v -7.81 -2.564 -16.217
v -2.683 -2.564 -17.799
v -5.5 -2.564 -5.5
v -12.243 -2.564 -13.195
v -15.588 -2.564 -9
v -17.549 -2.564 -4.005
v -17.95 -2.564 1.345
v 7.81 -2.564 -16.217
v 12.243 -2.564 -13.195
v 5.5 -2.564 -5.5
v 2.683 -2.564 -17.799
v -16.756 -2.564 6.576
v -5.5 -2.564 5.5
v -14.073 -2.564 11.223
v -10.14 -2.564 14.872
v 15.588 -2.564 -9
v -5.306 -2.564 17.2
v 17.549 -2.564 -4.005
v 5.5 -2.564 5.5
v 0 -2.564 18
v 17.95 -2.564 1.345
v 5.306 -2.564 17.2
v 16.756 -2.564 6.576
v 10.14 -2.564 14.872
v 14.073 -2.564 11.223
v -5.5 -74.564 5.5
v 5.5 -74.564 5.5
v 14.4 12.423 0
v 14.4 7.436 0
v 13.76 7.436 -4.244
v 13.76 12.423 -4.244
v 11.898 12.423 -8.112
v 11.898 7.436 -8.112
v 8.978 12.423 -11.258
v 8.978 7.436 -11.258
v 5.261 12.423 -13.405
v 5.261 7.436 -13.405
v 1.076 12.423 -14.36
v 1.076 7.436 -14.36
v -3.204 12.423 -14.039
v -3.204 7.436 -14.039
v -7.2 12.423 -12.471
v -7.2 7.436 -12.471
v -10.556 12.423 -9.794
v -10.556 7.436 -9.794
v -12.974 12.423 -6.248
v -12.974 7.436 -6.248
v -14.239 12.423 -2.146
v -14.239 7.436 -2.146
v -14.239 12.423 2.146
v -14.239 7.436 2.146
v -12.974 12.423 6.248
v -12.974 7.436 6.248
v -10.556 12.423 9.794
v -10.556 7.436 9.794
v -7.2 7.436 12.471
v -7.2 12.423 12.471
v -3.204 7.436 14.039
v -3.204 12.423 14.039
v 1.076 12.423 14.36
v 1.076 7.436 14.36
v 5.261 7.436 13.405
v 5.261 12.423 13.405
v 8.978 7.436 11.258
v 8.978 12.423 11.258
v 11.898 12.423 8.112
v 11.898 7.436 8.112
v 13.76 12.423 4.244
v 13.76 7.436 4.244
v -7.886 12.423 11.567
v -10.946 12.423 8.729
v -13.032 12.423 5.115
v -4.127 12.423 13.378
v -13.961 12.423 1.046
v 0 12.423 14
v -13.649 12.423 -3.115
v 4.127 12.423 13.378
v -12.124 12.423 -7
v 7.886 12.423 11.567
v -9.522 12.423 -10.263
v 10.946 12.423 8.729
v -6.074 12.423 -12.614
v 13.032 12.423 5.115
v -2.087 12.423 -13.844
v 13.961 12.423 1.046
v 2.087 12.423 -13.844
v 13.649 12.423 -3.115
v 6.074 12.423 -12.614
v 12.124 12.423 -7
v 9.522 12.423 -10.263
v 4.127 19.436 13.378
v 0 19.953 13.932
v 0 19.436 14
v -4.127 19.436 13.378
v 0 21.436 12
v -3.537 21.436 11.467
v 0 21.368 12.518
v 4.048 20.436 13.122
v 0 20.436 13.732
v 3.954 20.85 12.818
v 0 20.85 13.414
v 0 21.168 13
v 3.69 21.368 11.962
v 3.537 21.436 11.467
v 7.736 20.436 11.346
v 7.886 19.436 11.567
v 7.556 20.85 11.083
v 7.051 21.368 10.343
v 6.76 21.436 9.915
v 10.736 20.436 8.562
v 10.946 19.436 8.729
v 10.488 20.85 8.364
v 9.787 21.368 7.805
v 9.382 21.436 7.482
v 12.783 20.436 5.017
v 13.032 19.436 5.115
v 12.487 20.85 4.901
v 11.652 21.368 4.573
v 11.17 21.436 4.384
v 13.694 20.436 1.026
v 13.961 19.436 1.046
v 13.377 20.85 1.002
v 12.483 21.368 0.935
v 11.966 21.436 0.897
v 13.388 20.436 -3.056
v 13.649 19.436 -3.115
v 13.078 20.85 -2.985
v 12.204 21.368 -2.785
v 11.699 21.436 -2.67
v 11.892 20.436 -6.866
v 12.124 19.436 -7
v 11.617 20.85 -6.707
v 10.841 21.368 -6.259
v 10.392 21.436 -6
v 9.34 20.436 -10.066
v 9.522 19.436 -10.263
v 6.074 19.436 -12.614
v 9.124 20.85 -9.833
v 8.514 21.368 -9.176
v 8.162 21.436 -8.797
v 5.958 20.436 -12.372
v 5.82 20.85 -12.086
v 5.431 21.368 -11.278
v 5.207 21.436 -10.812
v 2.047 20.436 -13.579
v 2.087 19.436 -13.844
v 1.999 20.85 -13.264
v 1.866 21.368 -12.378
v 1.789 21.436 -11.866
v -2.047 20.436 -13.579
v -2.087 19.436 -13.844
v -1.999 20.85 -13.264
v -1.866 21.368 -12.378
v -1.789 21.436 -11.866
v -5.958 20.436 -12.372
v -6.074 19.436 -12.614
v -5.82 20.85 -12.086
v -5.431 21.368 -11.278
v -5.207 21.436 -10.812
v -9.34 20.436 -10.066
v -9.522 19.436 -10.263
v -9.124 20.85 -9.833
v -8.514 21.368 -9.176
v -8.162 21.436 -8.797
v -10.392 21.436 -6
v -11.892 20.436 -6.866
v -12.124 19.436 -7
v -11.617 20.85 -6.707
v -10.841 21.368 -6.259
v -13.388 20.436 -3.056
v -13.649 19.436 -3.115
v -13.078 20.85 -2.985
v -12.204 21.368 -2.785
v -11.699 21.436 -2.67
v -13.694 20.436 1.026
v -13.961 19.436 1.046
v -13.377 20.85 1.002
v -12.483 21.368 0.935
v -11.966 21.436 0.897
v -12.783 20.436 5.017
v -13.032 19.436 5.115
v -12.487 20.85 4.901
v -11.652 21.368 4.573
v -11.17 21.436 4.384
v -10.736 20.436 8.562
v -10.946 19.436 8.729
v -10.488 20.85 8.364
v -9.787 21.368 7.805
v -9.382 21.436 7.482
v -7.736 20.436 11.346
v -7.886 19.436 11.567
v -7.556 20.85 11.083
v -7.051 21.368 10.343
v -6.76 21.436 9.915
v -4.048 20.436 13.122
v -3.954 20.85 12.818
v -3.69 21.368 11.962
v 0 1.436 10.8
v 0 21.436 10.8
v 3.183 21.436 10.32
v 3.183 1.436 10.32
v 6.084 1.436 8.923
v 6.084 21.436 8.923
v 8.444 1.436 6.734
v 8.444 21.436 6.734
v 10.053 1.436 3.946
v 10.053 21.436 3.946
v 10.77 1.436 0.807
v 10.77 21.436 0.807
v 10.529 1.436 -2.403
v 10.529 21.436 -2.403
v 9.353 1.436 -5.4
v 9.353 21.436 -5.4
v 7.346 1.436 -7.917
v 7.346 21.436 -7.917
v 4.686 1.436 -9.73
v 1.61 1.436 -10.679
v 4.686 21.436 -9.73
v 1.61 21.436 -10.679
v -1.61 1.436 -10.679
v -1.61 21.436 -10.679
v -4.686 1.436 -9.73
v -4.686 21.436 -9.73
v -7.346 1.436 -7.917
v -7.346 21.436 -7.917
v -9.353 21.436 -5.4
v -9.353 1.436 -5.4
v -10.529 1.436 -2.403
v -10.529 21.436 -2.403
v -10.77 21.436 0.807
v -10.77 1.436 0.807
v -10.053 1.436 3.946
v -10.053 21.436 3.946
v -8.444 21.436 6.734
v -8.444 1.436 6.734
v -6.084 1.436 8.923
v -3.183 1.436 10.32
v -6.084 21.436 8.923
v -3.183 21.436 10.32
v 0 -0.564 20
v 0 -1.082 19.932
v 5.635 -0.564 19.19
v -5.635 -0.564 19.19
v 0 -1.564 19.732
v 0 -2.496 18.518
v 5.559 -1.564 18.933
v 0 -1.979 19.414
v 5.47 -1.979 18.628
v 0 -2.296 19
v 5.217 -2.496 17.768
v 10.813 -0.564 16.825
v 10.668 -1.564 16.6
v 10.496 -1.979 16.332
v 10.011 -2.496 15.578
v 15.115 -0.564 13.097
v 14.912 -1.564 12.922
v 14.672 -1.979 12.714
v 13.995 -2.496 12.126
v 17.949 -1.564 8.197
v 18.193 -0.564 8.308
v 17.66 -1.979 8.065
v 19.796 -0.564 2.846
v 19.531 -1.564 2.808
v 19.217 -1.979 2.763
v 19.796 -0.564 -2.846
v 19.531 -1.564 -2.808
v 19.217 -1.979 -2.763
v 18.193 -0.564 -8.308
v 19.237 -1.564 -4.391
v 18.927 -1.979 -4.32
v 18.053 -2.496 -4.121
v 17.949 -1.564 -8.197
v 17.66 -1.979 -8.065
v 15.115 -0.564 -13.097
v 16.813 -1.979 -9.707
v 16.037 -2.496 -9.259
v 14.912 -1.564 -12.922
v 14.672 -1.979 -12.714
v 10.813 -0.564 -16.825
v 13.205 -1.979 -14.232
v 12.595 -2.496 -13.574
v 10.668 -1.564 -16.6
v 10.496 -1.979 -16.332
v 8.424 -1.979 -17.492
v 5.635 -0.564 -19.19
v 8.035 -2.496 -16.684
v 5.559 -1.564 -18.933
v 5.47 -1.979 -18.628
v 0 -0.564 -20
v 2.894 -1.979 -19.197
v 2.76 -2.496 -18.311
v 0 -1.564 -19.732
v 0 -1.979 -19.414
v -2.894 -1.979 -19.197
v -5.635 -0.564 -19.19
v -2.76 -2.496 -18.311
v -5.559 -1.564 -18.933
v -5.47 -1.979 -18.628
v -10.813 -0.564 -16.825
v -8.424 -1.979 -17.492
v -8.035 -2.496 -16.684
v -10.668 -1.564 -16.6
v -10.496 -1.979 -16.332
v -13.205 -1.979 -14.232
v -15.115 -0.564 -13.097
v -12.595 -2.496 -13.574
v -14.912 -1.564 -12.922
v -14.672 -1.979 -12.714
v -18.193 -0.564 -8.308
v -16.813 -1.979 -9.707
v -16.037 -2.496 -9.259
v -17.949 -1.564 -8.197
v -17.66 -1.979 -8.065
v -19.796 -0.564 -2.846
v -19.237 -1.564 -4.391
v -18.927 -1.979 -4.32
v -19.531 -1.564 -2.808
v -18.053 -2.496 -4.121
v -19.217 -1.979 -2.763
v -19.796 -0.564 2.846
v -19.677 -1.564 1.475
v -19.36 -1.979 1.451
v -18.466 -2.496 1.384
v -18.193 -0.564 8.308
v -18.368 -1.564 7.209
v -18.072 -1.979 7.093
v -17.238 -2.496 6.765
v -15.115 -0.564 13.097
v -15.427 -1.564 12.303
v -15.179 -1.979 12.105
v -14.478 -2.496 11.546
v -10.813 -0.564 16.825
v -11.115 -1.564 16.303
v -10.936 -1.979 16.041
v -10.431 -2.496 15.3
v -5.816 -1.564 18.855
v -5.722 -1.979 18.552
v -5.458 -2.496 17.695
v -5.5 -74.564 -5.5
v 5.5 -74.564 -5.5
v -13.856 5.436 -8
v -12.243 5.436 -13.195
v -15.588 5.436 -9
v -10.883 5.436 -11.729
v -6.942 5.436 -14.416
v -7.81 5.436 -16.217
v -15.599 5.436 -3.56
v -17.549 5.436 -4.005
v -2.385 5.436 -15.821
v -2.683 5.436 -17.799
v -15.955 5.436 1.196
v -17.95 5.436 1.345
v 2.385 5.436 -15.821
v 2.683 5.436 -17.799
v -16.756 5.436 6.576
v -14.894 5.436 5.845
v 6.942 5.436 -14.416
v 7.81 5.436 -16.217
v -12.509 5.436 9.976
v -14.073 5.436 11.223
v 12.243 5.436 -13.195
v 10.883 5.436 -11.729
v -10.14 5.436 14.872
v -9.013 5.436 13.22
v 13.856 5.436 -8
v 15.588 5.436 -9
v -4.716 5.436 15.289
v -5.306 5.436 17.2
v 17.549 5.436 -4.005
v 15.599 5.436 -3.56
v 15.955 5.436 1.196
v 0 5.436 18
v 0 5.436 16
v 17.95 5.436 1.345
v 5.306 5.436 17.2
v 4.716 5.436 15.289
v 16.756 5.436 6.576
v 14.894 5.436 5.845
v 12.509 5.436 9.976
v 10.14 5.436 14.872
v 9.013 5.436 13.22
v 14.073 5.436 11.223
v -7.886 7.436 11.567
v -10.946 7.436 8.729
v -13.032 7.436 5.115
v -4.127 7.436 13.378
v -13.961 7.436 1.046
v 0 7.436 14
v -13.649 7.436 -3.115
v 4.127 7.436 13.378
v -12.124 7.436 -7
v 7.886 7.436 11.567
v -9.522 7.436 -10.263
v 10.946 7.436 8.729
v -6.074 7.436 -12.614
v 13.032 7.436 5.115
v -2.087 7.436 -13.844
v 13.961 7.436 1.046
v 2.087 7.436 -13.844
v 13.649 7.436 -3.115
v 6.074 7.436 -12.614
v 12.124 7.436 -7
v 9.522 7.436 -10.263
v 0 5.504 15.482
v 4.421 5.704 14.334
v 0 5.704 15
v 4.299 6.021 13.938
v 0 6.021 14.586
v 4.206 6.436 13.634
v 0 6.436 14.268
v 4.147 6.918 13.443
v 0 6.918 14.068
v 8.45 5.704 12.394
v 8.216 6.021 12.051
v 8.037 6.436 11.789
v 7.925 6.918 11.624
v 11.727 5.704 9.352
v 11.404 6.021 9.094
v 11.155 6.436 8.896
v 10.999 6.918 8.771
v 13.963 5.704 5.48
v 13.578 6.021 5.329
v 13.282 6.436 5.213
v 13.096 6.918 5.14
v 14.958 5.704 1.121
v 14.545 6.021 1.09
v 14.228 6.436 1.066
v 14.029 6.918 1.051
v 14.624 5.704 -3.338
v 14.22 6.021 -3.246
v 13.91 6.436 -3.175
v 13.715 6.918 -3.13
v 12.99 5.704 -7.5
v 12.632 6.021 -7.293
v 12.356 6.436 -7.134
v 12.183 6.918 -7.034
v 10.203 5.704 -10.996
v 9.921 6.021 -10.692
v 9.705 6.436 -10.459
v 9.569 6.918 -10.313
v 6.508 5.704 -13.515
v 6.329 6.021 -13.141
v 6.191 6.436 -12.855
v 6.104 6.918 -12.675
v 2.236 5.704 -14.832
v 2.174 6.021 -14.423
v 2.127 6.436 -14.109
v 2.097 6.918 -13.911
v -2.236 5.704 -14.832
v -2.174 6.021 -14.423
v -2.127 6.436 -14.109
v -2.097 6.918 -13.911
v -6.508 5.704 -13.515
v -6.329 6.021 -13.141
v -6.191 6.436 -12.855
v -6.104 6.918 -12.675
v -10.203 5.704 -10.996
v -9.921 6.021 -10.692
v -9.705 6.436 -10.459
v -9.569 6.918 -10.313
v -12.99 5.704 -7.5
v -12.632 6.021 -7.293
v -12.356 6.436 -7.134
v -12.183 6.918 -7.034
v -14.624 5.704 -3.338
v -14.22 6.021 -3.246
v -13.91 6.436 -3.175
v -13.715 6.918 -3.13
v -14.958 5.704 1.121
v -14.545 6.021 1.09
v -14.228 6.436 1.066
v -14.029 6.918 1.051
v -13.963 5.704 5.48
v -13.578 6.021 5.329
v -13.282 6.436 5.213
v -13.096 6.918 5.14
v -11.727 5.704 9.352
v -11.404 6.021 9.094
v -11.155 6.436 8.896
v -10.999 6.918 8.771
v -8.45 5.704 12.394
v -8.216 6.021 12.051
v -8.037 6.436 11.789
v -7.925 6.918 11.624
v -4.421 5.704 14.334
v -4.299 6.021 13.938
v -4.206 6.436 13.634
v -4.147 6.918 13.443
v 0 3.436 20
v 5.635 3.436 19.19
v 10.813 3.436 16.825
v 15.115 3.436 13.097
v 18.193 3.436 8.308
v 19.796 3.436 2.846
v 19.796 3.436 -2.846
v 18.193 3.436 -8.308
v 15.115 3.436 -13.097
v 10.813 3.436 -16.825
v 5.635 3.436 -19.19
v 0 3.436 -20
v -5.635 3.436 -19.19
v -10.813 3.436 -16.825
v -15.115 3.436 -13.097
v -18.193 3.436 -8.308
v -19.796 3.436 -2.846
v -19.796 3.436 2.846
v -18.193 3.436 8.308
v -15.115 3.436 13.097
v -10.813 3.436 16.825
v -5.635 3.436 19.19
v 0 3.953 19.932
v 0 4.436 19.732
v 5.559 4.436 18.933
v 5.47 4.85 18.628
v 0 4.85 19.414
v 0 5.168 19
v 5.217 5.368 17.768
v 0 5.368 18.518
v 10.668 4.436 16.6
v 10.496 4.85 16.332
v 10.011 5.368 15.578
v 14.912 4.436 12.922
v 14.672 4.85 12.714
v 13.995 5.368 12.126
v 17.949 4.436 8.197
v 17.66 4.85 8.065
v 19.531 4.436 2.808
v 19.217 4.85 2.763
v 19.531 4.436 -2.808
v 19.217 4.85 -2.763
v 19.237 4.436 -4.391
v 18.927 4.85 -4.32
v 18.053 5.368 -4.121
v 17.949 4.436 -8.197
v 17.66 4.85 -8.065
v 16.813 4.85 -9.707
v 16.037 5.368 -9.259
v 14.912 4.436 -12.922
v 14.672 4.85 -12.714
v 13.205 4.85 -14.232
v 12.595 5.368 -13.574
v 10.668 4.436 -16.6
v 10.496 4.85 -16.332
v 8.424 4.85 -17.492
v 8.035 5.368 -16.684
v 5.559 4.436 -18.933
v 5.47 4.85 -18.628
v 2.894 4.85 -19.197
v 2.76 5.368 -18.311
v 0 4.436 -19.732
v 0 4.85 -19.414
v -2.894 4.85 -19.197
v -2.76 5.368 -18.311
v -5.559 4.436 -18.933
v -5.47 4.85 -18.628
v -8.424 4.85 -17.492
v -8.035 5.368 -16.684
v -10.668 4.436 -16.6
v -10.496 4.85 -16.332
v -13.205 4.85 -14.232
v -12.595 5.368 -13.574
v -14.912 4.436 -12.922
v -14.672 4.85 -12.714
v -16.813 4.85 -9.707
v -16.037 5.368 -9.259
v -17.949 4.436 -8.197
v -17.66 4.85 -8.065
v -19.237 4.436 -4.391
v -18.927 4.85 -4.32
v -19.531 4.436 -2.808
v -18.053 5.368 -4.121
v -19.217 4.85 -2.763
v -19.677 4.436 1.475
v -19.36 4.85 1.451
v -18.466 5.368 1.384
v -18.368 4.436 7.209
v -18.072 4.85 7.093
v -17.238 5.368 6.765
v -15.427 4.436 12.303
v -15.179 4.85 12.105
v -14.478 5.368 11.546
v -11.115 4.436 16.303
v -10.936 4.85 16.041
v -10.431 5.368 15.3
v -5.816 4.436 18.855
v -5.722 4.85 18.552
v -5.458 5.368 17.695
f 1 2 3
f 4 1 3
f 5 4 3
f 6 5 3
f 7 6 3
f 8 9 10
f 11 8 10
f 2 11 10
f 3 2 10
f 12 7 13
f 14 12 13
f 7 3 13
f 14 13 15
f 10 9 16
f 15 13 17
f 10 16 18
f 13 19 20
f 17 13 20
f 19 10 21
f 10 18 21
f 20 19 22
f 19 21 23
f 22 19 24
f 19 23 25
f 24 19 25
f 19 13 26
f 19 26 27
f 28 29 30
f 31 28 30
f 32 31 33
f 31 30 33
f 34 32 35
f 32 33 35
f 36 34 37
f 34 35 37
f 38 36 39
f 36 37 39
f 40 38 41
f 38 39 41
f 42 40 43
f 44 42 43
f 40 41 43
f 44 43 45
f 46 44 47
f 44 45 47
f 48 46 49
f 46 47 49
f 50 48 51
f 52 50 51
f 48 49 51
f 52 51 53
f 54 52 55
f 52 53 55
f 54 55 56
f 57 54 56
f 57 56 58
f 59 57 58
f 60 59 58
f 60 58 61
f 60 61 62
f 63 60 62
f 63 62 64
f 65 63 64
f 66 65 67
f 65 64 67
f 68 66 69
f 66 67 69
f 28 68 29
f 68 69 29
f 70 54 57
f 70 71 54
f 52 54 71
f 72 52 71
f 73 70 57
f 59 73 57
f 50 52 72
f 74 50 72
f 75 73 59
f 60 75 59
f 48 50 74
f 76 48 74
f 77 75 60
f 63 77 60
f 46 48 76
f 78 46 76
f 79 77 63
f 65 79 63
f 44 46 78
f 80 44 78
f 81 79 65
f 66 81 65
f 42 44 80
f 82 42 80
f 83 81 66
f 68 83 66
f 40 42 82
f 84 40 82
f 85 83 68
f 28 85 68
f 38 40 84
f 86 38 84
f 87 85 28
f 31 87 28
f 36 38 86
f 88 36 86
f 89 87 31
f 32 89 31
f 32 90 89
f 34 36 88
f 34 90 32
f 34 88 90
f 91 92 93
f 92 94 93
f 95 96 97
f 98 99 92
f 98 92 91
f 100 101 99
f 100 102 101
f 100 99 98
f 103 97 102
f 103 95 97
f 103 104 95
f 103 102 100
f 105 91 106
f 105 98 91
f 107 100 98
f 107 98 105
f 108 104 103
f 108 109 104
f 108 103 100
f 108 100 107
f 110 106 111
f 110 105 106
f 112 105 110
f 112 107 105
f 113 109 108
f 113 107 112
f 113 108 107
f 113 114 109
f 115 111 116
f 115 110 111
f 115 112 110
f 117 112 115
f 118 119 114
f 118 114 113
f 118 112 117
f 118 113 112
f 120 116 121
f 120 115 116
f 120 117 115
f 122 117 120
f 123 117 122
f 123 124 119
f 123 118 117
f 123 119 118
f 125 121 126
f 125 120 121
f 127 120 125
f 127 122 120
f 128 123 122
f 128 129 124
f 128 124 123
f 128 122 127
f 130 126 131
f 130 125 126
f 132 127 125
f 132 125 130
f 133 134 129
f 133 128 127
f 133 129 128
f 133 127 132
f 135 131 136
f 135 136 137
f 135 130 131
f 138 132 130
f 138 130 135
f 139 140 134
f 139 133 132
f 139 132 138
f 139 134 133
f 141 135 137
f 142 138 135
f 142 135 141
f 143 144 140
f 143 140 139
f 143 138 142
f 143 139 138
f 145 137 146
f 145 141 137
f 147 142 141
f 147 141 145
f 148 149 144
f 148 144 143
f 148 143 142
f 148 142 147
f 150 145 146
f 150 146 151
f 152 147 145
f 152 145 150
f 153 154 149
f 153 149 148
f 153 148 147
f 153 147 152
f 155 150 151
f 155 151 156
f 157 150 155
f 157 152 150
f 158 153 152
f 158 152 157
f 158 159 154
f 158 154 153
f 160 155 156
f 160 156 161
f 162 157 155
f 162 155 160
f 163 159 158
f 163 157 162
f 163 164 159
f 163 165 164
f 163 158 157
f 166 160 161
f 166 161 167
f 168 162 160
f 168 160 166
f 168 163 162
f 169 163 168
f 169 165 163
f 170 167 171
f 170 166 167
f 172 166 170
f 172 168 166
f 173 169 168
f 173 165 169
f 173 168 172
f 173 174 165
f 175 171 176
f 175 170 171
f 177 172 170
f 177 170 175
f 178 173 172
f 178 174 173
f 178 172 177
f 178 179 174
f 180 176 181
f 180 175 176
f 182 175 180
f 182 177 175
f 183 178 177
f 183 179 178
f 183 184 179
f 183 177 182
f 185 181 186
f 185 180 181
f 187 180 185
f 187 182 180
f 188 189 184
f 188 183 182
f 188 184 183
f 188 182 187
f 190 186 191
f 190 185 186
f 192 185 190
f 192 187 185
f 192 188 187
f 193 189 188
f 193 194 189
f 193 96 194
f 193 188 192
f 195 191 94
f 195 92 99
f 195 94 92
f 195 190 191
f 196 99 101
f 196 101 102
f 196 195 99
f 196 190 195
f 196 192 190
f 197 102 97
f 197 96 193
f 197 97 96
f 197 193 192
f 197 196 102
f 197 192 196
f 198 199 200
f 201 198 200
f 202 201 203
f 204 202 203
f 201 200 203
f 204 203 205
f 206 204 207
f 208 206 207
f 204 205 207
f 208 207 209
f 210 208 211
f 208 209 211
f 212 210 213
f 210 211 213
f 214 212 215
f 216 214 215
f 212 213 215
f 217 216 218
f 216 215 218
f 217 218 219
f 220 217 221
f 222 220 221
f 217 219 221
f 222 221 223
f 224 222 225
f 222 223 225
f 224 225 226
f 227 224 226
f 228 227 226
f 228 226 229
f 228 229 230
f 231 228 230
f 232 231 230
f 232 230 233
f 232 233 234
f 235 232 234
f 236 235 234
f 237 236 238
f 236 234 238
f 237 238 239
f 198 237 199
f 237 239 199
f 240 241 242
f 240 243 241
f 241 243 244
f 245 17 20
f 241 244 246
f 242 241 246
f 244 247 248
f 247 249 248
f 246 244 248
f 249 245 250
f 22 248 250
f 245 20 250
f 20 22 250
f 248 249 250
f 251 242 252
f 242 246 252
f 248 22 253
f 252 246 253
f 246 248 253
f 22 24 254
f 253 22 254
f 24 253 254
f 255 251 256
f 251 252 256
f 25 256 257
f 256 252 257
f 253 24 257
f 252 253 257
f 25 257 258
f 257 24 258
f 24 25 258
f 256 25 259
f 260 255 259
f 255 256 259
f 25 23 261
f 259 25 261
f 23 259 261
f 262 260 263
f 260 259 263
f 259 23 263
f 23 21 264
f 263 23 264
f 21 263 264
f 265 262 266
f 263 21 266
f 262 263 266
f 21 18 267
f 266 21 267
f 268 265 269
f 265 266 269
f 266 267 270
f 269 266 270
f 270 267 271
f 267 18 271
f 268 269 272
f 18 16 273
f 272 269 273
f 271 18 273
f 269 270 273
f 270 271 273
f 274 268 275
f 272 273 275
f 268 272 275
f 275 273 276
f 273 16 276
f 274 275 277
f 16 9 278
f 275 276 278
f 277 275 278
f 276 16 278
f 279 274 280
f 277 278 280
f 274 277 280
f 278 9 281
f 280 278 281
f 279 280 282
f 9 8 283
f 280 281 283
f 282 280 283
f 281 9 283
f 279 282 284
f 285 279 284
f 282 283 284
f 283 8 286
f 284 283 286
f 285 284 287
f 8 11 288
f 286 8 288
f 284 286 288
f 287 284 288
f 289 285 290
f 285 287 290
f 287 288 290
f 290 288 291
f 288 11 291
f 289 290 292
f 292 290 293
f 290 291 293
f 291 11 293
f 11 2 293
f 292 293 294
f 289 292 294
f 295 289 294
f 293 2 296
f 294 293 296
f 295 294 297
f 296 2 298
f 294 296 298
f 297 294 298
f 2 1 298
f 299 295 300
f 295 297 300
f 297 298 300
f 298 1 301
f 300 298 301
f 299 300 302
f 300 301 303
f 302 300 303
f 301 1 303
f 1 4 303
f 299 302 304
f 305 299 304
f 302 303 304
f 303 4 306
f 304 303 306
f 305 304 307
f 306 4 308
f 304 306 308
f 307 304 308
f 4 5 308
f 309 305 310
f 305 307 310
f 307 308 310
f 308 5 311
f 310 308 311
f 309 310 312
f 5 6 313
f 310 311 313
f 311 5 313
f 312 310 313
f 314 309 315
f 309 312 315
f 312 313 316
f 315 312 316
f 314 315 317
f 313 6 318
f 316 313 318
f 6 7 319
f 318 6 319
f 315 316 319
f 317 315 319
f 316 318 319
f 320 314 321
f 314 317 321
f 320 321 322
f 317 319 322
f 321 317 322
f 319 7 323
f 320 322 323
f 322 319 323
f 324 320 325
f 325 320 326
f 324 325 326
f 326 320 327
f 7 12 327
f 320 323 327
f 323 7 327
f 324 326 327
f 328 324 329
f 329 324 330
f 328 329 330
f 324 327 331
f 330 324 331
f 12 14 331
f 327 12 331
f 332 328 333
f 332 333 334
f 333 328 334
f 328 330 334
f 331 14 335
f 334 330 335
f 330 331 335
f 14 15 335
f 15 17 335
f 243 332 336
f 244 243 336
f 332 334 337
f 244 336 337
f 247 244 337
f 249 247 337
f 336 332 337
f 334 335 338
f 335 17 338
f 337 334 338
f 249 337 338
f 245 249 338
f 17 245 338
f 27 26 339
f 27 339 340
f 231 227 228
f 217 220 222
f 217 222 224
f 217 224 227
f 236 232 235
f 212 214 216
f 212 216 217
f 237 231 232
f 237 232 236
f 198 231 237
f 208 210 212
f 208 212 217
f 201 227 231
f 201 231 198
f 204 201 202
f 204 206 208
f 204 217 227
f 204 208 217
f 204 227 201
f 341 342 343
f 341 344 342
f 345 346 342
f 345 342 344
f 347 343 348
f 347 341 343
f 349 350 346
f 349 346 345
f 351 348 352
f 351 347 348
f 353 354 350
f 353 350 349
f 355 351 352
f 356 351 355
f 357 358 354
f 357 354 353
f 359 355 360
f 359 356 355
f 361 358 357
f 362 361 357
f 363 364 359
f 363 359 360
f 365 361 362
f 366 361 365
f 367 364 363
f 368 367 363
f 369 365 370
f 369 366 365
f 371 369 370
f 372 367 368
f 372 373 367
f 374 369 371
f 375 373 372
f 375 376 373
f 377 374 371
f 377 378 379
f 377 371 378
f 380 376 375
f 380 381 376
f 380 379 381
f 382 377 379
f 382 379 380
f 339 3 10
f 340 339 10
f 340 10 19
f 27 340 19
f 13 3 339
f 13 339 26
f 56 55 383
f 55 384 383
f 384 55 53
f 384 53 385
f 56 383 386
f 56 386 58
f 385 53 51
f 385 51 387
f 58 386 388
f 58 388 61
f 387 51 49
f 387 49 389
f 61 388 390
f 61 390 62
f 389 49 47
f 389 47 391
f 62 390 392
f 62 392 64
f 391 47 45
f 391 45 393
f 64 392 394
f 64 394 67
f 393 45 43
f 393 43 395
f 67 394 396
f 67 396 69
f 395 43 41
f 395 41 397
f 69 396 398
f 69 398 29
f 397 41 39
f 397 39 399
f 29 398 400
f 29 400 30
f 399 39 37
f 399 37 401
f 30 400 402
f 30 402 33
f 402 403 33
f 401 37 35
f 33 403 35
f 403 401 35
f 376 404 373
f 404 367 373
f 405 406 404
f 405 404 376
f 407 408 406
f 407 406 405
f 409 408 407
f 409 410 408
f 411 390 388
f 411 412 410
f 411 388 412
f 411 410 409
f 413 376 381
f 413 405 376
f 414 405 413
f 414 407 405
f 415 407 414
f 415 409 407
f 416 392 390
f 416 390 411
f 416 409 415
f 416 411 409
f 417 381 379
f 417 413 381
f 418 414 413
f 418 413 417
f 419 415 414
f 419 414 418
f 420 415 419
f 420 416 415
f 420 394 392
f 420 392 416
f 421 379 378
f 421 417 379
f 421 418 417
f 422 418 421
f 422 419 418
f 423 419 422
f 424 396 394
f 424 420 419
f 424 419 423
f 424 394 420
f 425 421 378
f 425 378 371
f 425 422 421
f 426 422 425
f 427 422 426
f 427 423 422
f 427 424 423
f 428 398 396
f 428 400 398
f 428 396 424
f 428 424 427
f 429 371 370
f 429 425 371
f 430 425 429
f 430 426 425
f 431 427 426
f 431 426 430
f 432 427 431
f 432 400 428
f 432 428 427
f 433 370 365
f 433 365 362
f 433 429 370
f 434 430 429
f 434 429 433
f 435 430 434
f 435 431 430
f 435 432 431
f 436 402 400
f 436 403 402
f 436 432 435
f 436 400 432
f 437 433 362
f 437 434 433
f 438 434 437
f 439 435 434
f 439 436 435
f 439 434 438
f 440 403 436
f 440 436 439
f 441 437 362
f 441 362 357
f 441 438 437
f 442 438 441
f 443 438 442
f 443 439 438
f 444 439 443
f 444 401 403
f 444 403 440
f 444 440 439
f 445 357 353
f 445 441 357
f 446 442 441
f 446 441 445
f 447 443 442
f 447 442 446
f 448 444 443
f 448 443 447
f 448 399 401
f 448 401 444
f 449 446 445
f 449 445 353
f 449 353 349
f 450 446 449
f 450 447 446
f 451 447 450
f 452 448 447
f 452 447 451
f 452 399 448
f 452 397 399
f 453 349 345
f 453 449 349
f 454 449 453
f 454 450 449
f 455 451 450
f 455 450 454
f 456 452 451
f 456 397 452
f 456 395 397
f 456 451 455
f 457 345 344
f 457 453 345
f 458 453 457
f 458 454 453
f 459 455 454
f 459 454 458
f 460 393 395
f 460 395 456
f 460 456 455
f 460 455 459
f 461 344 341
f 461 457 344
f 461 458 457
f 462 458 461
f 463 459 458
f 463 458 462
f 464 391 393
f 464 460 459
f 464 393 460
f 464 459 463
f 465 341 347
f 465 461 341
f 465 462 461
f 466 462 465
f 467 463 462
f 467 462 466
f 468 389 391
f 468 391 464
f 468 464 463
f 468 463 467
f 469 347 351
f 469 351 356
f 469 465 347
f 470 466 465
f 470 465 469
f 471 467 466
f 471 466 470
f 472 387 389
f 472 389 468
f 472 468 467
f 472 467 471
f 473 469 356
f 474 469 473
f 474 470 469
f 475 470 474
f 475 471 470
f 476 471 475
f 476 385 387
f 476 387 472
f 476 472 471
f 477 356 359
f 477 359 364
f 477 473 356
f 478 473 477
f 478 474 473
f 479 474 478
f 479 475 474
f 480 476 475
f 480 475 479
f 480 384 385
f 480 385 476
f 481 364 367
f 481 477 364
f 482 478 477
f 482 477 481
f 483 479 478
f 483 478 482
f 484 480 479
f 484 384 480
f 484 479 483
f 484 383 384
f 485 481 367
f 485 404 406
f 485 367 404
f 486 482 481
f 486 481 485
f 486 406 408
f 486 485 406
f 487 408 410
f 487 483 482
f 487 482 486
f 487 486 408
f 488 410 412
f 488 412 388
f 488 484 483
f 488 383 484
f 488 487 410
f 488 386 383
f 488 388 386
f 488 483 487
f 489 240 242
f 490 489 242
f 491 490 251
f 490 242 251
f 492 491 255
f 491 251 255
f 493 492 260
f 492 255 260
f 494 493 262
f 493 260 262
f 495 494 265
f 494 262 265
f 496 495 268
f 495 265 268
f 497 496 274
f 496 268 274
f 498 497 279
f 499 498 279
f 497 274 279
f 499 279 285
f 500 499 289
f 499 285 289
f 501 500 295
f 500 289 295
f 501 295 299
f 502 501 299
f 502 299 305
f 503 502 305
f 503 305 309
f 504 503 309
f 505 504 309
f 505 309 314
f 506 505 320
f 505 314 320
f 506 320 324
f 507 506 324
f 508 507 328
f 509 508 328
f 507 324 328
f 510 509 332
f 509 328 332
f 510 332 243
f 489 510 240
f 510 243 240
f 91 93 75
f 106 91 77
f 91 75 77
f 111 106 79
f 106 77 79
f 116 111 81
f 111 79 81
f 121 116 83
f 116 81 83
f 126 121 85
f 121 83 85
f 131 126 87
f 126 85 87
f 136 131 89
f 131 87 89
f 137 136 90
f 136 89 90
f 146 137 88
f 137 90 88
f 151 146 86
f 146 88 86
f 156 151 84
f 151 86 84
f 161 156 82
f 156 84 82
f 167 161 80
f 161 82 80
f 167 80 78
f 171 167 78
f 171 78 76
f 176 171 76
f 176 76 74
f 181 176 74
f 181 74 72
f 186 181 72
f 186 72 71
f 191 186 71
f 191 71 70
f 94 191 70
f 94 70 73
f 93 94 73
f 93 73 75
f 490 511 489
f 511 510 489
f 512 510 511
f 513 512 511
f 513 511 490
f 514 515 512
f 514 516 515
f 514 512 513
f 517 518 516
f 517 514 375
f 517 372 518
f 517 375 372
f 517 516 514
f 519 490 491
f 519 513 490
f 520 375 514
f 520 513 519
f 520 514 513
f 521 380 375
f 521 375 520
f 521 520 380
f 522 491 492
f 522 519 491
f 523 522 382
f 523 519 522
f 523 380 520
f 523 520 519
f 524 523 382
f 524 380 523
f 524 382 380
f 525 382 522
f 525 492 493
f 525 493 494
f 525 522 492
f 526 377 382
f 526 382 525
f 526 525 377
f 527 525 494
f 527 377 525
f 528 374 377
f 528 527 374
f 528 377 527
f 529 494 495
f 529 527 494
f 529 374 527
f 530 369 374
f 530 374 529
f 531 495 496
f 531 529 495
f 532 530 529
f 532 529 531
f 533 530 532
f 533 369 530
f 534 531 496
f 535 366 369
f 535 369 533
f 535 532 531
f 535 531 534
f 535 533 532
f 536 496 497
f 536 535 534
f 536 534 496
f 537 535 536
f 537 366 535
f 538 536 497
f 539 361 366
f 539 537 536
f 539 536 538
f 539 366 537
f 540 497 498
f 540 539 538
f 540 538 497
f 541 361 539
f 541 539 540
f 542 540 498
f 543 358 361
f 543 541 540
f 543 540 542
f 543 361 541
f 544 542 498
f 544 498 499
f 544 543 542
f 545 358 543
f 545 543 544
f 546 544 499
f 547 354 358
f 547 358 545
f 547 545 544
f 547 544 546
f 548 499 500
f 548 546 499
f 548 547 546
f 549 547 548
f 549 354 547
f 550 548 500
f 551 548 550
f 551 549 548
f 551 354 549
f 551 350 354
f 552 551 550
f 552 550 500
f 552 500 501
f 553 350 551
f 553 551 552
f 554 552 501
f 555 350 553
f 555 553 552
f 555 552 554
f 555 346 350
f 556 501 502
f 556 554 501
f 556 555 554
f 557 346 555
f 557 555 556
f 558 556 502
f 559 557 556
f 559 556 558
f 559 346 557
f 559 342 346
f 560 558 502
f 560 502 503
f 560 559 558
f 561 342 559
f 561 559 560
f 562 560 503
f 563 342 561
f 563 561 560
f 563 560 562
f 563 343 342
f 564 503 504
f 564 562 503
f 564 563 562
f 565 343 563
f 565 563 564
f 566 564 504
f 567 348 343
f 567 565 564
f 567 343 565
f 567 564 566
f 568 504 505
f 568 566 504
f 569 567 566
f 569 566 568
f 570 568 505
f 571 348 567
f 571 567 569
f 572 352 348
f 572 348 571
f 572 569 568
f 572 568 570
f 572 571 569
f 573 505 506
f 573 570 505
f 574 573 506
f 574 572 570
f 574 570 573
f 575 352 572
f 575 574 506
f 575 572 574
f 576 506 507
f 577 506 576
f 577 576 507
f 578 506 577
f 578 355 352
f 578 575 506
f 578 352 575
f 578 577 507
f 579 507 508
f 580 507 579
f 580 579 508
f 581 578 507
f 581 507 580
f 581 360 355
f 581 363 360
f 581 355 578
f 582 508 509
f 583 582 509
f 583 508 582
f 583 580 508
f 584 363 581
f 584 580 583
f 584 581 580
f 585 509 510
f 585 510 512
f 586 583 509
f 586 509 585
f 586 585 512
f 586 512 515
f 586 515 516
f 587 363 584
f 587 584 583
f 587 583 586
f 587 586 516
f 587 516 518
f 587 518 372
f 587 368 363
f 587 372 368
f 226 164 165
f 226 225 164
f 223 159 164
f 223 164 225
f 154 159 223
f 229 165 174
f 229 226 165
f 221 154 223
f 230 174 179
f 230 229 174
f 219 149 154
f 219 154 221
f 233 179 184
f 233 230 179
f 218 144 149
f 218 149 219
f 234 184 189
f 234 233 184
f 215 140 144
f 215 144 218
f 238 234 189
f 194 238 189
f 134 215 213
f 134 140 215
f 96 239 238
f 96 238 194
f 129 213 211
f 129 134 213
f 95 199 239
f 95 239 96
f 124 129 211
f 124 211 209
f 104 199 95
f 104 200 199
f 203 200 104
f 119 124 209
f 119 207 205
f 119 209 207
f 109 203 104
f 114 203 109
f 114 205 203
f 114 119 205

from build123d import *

# Parameters (mm, degrees)
SKETCH2_R           = 25
BOSS_EXTRUDE1_DEPTH = 10
SKETCH3_R           = 17.5
BOSS_EXTRUDE3_DEPTH = 20
SKETCH4_R           = 13.5
CUT_EXTRUDE1_DEPTH  = 25
SKETCH5_W           = 13.75
SKETCH5_H           = 13.75
BOSS_EXTRUDE4_DEPTH = 100
FILLET2_R           = 2.5
FILLET3_R           = 2.5
WRAP1_START         = 12.5
WRAP1_OUTLINE_R     = 18
WRAP1_OUTLINE_R_2   = 17.5
WRAP1_DEPTH         = 6.23469337
SKETCH8_W           = 13.75
SKETCH8_H           = 13.75
CUT_EXTRUDE2_DEPTH  = 5
SKETCH8_2_W         = 13.75
SKETCH8_2_H         = 13.75
CUT_EXTRUDE3_DEPTH  = 10
SCALE1_SCALE        = 0.8


# Read off the part's stored shape, not the designer's step: Wrap1
with BuildPart() as part:
    # Sketch2 → Boss-Extrude1 (new body)
    with BuildSketch(Plane(origin=(0, 0, 0), x_dir=(1, 0, 0), z_dir=(0, 1, 0))):
        with Locations(Location((0, 0, 0), (0, 0, 270))):
            Circle(SKETCH2_R)
    extrude(amount=BOSS_EXTRUDE1_DEPTH)

    # Sketch3 → Boss-Extrude3 (add)
    with BuildSketch(Plane(origin=(0, 10, 0), x_dir=(1, 0, 0), z_dir=(0, 1, 0))):
        with Locations(Location((0, 0, 0), (0, 0, 270))):
            Circle(SKETCH3_R)
    extrude(amount=BOSS_EXTRUDE3_DEPTH)

    # Sketch4 → Cut-Extrude1 (cut)
    with BuildSketch(Plane(origin=(0, 30, 0), x_dir=(1, 0, 0), z_dir=(0, 1, 0))):
        with Locations(Location((0, 0, 0), (0, 0, 270))):
            Circle(SKETCH4_R)
    extrude(amount=-CUT_EXTRUDE1_DEPTH, mode=Mode.SUBTRACT)

    # Sketch5 → Boss-Extrude4 (add)
    with BuildSketch(Plane.XZ):
        Rectangle(SKETCH5_W, SKETCH5_H)
    extrude(amount=BOSS_EXTRUDE4_DEPTH)

    # Fillet2
    fillet2_edges = [part.edges().sort_by_distance(p)[0] for p in [
        (0, 0, -25),
        (0, 10, -25),
        (0, 10, -17.5),
    ]]
    fillet(fillet2_edges, radius=FILLET2_R)

    # Fillet3
    fillet3_edges = [part.edges().sort_by_distance(p)[0] for p in [
        (0, 30, -17.5),
    ]]
    fillet(fillet3_edges, radius=FILLET3_R)

    # Wrap1 outline → Wrap1 (add)
    with BuildSketch(Plane(origin=(0, 0, 0), x_dir=(1, 0, 0), z_dir=(0, 1, 0)).offset(WRAP1_START)):
        Circle(WRAP1_OUTLINE_R)
        Circle(WRAP1_OUTLINE_R_2, mode=Mode.SUBTRACT)
    extrude(amount=WRAP1_DEPTH)

    # Sketch8 → Cut-Extrude2 (cut)
    with BuildSketch(Plane.XZ.offset(100)):
        Rectangle(SKETCH8_W, SKETCH8_H)
    extrude(amount=-CUT_EXTRUDE2_DEPTH, mode=Mode.SUBTRACT)

    # Sketch8<2> → Cut-Extrude3 (cut)
    with BuildSketch(Plane.XZ.offset(100)):
        Rectangle(SKETCH8_2_W, SKETCH8_2_H)
    extrude(amount=-CUT_EXTRUDE3_DEPTH, mode=Mode.SUBTRACT)


with BuildPart() as part_1:
    # Scale1: scaled about (0, -12.821549585, 0)
    add(part.part.scale(SCALE1_SCALE).moved(Location((0, -2.564309917, 0))))


solid = part_1.part
